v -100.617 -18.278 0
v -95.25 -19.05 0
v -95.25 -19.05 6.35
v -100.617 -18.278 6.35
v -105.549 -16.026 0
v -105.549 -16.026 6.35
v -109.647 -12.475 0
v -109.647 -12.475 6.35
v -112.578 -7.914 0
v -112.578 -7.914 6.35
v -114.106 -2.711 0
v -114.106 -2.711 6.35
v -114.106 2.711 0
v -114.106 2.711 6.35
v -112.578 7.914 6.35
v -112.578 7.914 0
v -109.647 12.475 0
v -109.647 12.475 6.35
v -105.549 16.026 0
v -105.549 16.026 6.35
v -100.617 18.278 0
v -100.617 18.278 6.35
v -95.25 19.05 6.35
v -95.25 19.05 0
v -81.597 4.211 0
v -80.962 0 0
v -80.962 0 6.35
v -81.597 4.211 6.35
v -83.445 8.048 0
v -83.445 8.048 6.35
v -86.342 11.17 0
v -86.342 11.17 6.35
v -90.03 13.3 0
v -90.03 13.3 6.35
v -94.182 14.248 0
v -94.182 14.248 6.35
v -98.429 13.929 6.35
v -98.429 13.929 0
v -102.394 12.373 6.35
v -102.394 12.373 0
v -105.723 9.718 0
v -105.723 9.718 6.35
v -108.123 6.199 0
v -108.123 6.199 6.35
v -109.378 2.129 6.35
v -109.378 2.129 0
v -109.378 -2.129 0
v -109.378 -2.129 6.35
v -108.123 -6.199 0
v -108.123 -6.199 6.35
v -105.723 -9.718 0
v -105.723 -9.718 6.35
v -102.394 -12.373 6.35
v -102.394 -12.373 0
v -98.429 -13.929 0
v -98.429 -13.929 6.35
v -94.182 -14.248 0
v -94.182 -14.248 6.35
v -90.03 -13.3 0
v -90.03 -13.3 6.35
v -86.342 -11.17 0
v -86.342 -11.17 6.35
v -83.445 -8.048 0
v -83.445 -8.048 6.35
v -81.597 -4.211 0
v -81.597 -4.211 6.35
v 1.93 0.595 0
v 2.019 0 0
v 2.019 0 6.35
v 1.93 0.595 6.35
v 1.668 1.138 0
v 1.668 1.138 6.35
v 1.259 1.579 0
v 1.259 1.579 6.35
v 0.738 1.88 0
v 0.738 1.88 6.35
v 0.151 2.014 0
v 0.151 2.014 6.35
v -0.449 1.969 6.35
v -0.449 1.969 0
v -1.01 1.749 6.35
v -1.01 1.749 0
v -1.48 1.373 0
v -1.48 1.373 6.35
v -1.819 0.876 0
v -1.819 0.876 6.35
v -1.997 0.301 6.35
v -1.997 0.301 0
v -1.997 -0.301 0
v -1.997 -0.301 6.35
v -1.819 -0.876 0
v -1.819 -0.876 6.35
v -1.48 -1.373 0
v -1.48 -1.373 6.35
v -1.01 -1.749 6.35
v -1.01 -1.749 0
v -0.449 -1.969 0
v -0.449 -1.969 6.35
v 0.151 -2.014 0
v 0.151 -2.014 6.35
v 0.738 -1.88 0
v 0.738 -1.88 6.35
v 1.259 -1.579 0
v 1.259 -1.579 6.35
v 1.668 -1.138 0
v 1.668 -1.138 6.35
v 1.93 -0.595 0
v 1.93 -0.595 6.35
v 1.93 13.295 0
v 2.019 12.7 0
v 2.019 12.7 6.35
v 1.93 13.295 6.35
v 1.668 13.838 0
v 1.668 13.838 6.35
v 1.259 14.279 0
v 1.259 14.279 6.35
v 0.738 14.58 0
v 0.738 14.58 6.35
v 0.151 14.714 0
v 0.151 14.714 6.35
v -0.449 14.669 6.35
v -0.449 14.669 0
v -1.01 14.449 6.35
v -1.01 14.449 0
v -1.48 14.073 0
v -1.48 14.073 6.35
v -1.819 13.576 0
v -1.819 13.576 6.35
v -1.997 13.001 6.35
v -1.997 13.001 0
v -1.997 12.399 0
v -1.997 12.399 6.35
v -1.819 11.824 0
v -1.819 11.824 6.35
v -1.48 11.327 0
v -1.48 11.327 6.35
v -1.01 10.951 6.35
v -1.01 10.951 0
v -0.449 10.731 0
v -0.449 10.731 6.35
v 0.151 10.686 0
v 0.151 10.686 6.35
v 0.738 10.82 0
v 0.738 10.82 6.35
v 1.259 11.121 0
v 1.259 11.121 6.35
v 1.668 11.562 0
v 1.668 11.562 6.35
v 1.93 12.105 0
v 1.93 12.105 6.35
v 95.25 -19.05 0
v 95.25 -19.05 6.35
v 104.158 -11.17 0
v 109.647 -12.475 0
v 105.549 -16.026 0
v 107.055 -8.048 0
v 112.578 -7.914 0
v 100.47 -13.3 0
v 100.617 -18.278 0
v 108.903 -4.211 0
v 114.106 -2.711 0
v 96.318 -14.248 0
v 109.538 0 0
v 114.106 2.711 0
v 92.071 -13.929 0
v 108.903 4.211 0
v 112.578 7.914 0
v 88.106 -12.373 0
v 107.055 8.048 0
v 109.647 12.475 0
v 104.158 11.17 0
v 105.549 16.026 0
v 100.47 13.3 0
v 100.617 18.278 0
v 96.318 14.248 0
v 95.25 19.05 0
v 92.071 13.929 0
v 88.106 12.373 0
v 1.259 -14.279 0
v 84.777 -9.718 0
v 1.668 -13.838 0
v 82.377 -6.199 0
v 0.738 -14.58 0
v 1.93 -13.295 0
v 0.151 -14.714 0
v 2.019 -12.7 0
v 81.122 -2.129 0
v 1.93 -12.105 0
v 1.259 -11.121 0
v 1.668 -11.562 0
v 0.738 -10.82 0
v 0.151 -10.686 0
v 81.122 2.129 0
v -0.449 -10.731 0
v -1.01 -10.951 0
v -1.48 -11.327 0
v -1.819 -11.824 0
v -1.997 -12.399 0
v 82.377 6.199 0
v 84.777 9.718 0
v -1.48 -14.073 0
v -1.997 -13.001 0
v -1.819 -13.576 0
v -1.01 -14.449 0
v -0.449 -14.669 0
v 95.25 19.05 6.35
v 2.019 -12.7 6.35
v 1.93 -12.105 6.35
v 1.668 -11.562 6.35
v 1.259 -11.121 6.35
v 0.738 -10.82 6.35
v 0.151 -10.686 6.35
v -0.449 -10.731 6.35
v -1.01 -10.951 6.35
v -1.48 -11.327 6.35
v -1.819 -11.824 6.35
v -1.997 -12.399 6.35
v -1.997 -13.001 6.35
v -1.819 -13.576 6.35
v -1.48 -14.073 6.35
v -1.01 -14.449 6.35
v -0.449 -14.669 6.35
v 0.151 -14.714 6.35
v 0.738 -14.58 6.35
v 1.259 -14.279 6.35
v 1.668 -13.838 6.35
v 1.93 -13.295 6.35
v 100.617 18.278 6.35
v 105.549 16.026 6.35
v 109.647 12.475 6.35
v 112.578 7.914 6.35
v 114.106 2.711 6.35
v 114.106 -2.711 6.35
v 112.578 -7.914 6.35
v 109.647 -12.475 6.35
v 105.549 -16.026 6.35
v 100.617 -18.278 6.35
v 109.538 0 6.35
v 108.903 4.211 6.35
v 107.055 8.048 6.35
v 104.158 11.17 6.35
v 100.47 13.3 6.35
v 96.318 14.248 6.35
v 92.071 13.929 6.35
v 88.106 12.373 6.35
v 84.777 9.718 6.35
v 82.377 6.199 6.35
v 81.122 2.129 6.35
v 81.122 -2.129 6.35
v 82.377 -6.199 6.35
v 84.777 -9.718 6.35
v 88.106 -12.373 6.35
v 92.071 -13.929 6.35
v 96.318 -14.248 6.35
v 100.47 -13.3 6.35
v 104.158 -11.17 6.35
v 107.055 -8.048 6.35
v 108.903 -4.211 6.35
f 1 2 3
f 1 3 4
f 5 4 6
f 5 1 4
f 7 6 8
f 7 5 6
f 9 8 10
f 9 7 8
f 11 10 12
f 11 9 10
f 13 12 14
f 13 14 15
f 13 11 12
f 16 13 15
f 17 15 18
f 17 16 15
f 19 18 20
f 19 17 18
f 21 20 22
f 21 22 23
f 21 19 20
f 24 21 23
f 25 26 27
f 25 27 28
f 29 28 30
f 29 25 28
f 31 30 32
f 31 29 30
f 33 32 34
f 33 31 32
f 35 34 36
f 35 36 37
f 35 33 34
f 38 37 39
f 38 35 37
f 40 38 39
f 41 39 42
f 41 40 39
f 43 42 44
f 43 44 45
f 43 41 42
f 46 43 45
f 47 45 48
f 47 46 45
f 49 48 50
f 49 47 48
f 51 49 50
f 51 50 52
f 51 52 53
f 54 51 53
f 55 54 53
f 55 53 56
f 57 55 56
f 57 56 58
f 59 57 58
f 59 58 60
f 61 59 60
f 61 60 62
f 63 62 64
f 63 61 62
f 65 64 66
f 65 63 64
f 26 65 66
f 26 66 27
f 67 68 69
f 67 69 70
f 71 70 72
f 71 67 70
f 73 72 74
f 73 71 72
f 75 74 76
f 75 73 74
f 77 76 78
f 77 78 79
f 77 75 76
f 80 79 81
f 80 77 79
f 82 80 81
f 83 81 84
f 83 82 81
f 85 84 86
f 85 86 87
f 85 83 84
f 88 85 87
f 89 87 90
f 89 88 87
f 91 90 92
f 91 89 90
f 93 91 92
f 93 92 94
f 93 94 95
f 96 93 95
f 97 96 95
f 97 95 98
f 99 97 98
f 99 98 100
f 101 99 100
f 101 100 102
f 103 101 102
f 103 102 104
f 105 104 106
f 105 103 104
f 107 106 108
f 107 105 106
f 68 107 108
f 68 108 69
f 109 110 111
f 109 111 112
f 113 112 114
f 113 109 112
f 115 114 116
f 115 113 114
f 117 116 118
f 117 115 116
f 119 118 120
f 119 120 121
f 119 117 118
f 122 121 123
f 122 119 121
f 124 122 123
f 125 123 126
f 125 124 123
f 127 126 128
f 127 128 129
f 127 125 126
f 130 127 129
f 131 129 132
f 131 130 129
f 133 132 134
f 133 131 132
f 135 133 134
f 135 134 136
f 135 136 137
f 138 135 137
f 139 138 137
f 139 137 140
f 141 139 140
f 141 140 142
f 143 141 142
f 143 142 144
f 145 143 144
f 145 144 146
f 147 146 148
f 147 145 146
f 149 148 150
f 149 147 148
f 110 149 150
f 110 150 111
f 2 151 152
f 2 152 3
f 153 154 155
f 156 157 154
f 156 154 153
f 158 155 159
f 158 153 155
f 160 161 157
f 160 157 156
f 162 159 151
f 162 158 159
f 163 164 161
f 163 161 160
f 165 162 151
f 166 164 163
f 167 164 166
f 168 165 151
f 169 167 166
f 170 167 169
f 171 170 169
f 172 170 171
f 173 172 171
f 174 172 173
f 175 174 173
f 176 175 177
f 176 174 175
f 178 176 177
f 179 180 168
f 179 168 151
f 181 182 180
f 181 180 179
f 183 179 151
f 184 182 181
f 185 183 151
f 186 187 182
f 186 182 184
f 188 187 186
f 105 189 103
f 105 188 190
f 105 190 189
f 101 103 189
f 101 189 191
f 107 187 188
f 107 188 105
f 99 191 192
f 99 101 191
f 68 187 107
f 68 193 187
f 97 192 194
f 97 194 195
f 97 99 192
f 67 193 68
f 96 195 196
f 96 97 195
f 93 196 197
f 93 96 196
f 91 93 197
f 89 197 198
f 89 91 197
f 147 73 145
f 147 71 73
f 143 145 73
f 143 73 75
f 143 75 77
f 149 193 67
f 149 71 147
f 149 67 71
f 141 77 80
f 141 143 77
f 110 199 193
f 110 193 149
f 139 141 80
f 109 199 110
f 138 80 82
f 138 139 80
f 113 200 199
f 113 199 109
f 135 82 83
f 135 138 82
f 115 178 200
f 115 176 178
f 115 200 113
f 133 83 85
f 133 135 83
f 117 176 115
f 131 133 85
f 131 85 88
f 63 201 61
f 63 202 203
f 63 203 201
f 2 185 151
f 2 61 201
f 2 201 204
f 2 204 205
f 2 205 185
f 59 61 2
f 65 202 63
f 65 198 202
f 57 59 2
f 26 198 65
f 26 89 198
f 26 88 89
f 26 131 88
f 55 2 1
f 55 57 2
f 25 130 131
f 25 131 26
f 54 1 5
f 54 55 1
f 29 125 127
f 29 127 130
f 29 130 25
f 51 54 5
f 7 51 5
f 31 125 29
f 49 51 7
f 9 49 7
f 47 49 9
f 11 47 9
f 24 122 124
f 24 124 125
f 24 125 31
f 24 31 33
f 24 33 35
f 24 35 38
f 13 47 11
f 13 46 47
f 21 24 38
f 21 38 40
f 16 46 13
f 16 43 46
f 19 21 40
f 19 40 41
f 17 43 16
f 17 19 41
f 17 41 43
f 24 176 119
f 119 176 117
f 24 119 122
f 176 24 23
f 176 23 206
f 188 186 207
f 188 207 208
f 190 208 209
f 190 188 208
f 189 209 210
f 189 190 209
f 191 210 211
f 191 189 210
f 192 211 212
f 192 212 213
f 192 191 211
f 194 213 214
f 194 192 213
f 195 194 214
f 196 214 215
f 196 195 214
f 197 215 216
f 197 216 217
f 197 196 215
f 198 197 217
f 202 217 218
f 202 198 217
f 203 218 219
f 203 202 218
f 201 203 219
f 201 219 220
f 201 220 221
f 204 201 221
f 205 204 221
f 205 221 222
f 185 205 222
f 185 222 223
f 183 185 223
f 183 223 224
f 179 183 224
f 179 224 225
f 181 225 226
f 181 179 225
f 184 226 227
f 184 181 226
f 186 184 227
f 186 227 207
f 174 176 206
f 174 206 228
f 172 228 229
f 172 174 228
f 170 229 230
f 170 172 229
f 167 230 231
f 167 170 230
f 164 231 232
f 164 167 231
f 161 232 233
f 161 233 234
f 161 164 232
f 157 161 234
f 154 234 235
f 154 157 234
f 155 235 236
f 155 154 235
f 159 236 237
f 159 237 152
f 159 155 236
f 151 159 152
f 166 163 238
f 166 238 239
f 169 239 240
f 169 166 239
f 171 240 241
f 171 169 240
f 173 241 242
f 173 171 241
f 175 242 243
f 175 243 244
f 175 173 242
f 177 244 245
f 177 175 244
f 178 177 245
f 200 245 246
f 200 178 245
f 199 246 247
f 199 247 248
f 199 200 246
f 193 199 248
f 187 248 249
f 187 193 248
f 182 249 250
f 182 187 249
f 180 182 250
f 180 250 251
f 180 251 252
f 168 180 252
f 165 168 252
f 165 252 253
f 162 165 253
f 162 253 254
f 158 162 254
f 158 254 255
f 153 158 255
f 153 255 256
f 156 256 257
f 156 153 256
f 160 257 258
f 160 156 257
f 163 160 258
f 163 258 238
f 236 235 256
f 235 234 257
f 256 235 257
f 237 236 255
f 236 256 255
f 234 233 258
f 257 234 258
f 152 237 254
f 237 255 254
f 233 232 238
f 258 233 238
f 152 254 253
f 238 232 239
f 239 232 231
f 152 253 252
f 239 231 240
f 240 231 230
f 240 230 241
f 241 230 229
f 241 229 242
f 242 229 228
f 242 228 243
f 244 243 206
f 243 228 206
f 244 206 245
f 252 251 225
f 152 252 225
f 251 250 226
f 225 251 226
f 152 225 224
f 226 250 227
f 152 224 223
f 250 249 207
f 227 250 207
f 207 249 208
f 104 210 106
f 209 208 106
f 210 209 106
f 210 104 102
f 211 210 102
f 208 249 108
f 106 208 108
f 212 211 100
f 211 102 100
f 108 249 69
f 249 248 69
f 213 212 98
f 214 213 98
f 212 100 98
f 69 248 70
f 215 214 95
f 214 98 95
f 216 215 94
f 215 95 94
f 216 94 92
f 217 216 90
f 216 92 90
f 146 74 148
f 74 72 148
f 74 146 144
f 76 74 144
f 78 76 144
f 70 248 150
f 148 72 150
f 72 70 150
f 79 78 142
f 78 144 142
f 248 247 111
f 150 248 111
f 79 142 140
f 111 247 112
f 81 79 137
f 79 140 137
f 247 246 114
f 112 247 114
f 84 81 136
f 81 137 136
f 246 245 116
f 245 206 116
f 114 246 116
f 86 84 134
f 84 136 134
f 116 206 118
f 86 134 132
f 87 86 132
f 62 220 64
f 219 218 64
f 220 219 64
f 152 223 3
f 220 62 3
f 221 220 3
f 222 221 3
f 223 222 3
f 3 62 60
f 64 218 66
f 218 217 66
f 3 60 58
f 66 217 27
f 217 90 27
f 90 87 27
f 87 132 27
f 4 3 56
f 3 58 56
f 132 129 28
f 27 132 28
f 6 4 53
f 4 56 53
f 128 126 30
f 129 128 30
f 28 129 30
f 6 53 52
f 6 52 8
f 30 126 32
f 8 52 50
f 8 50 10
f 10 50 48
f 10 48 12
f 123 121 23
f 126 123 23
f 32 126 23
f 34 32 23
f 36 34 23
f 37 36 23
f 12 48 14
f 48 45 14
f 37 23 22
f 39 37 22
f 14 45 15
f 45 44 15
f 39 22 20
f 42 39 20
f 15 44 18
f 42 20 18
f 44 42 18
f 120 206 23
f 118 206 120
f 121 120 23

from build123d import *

# Parameters (mm, degrees)
SKETCH1_R           = 14.2875
SKETCH1_R_2         = 2.0193
BOSS_EXTRUDE1_DEPTH = 6.35


with BuildPart() as part:
    # Sketch1 → Boss-Extrude1 (new body)
    with BuildSketch(Plane.XY):
        with BuildLine():
            Line((-95.25, 19.05), (95.25, 19.05))
            ThreePointArc((95.25, 19.05), (114.3, 0), (95.25, -19.05))
            Line((95.25, -19.05), (-95.25, -19.05))
            ThreePointArc((-95.25, -19.05), (-114.3, 0), (-95.25, 19.05))
        make_face()
        with Locations((-95.25, 0)):
            Circle(SKETCH1_R, mode=Mode.SUBTRACT)
        with Locations((95.25, 0)):
            Circle(SKETCH1_R, mode=Mode.SUBTRACT)
        with Locations((0, 12.7)):
            Circle(SKETCH1_R_2, mode=Mode.SUBTRACT)
        Circle(SKETCH1_R_2, mode=Mode.SUBTRACT)
        with Locations((0, -12.7)):
            Circle(SKETCH1_R_2, mode=Mode.SUBTRACT)
    extrude(amount=BOSS_EXTRUDE1_DEPTH)


solid = part.part
